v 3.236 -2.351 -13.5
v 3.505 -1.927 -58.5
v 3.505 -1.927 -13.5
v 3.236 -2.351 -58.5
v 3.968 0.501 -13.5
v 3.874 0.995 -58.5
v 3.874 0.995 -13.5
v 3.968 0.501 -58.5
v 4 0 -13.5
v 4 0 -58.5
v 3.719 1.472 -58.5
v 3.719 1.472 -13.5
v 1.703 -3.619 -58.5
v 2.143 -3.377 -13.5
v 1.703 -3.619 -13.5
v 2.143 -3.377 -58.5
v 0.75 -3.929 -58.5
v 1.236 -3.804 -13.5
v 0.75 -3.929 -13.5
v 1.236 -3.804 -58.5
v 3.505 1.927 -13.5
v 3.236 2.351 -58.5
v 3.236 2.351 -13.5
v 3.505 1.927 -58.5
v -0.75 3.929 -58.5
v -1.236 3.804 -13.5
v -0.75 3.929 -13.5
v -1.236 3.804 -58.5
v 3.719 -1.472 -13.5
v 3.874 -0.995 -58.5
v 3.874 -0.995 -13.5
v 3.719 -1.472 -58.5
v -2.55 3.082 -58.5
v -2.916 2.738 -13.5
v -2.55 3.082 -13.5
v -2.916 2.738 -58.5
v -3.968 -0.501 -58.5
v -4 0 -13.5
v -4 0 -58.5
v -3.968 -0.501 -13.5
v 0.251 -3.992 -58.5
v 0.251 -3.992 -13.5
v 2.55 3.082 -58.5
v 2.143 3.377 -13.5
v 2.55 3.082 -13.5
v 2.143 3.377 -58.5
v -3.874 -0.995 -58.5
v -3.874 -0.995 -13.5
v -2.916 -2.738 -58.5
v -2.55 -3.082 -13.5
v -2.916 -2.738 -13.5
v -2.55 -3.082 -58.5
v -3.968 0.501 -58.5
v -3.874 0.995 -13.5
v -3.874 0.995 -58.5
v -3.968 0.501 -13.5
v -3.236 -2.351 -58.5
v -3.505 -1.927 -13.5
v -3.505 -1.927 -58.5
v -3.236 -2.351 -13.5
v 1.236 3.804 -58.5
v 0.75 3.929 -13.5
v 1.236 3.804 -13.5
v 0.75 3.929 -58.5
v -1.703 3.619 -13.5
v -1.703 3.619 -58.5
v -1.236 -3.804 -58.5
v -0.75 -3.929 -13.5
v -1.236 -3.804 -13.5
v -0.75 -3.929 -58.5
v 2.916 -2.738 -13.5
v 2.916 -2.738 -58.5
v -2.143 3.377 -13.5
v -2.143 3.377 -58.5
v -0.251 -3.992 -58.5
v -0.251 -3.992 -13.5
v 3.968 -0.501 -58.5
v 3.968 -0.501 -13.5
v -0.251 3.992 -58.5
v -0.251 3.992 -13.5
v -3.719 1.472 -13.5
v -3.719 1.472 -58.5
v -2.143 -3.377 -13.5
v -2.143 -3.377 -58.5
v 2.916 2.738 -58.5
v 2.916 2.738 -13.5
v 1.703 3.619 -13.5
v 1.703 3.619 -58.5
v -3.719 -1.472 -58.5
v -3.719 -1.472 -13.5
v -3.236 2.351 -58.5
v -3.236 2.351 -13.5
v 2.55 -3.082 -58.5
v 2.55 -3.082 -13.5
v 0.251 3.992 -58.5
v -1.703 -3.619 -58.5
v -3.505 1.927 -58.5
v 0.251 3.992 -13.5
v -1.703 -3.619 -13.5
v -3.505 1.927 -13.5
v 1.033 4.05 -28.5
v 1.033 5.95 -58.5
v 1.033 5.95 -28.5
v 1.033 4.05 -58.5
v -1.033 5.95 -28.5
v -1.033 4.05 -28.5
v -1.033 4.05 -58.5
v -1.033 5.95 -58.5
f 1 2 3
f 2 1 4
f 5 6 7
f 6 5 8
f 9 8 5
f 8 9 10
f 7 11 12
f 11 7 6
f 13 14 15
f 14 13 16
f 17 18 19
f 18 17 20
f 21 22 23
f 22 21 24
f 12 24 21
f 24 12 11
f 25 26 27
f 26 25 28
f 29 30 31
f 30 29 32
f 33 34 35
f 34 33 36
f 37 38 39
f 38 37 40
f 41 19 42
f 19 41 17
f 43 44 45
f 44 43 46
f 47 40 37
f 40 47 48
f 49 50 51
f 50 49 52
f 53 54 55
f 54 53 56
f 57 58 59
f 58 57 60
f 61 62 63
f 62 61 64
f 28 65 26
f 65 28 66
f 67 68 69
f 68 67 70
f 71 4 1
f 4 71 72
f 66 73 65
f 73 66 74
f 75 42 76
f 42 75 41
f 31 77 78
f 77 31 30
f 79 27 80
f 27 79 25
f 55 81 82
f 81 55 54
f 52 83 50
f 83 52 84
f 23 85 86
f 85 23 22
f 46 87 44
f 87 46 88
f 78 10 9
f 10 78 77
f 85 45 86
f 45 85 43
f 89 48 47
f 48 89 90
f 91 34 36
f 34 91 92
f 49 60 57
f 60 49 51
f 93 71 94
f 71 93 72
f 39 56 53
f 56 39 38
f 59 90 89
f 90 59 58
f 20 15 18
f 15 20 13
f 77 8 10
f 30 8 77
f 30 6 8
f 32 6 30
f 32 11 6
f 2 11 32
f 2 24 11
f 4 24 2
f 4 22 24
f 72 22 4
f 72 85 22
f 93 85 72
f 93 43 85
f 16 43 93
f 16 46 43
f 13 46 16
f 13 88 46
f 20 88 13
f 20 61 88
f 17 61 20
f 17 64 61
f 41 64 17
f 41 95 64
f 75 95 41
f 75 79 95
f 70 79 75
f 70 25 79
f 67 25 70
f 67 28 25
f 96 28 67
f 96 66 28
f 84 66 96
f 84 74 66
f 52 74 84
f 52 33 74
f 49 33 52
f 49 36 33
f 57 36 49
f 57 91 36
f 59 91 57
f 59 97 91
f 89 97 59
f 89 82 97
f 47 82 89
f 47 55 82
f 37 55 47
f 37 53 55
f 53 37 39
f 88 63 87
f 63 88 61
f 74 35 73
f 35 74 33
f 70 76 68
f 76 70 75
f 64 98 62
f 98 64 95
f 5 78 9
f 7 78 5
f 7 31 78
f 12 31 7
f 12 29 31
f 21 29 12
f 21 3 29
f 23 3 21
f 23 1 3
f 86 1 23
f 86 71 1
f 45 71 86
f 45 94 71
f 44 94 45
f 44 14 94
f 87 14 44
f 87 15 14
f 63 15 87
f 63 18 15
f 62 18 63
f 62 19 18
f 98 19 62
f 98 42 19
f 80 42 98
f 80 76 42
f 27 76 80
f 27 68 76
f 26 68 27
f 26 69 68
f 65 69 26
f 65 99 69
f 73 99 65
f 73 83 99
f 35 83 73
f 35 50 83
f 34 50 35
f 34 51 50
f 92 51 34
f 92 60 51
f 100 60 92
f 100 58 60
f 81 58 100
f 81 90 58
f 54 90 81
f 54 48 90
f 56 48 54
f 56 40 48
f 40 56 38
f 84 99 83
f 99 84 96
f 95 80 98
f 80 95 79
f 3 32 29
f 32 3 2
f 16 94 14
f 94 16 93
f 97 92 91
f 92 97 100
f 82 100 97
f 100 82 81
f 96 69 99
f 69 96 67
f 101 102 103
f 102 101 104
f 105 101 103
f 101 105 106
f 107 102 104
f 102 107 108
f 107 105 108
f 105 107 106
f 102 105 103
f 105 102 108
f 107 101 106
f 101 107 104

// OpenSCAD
// file: steering_coupler.scad
$fn = 50;
include <../robot_settings.scad>


  module steering_coupler() {
  color("blue")
  difference() {
    cylinder(h = coupler_length, d = coupler_diameter, center = true);

    // top cutout for motor axle
    translate([0, 0, coupler_length / 2 - dc_motor_axle_notch_cutout_z / 2 + .1])
    cylinder(h = dc_motor_axle_notch_cutout_z, d = dc_motor_axle_cutout_d - dc_motor_axle_notch_cutout, center = true);

    // bottom cutout for steering shaft
    translate([0, 0,  - coupler_gear_side_insert / 2 - .1])
    cylinder(h = coupler_gear_side_insert, d = steering_shaft_d, center = true);

    // top screw cutout
    translate([0, 0, coupler_screw_z_offset])
    rotate([0, 90, 0])
    cylinder(h = coupler_diameter, d = coupler_screw_d, center = true);

    // bottom screw cutout
    translate([0, 0, -coupler_screw_z_offset])
    rotate([0, 90, 0])
    cylinder(h = coupler_diameter, d = coupler_screw_d, center = true);
  }
}


steering_coupler();
// file: ../robot_settings.scad
main_box_x = 95; // 96
main_box_y = 102;
main_box_z = 74; // 74.5
wall_thickness = 2;

rail_gap = 2;
rail_inset = 7;

rail_thickness = 7;
rail_length = 250;
rail_width = 200;

raspberry_pi_screw_seperation_y = 57;
raspberry_pi_screw_seperation_z = 48;
raspberry_pi_peg_h = 5;

battery_box_peg_h = 6;
battery_box_peg_d = 8;
battery_box_peg_cutout = 5;

gears_module = 1;
pinion_gear_teeth = 32;
pinion_gear_width = 5;
pinion_gear_bore = 8;

gears_setback_distance = 25;
gear_post_height = 2 * pinion_gear_width + rail_thickness + 8 ;

steering_motor_mount_x = 45;
steering_motor_mount_y = 36;
steering_motor_mount_z = 18;
steering_motor_mount_setback_distance = gears_setback_distance + 16;

dc_motor_drivertype = "Teyleten"; // Teyleten
isAdafruit = (dc_motor_drivertype == "Adafruit");

drv8871_x = isAdafruit ? 20.3 : 21.6;
drv8871_y = isAdafruit ?  24 : 25;

drv8871_z = 2;
drv8871_screw_d = 2.5;
drv8871_solder_points_z = 2;

drv8871mount_edge_x = 1.5;
drv8871mount_edge_wall = 3;
drv8871mount_z = 5;
drv8871mount_x = drv8871_x +  drv8871mount_edge_wall - 2* drv8871mount_edge_x;
drv8871mount_y = 19;

drv8871_screw_distance = 15.64;
drv8871_solder_points_d = 1.66;
drv8871_solder_offset_y = 4.4;
drv8871_solder_inner_points_distance = 5;
drv8871_solder_outer_points_distance = 12;

dc_motor_housing_minus_encoder_z = 48;
dc_motor_encoder_z = 9.33;
dc_motor_encoder_wheel_d = 13.4;
dc_motor_encoder_wheel_thickness = 5;
dc_motor_encoder_wheel_gap = 3;
dc_motor_encoder_circuit_thickness = 2;
dc_motor_cutout_d = 24.8;
dc_motor_cutout_z = 19.5;

dc_motor_screw_head_z = 2;
dc_motor_screw_head_d = 5.6;
dc_motor_screw_d = 3.2;
dc_motor_screw_offset = 8.5;

dc_motor_axle_ring_z = 3;
dc_motor_axle_ring_d = 7.2;
dc_motor_axle_cutout_d = 4.5;
dc_motor_axle_cutout_z = 10;
dc_motor_axle_notch_cutout = 0.4;
dc_motor_axle_notch_cutout_z = 6;

pdmount_x = 20;
pdmount_y = 30;
pdmount_z = 2;
pdmount_edge_x = 1.5;
pdmount_edge_wall = 3;

steering_shaft_z = 45;
steering_shaft_d = 7;
steering_shaft_motor_fitting_d = 9;
coupler_length = 24.6;
coupler_diameter = 14;
coupler_screw_d = 4;
coupler_screw_z_offset = 5;
coupler_gear_side_insert = 12.6;
steering_shaft_with_coupler_z = steering_shaft_z - coupler_gear_side_insert;

lidar_mount_y = 110;
lidar_mount_x = 65 + 20;
lidar_narrow_screws = 40;
lidar_wide_screws = 56;
lidar_front_to_back_screws = 70;
lidar_screw_d = 3;
lidar_circuitboard_x = 20;
lidar_circuitboard_y = 35;
lidar_circuitboard_z = 1.2;
lidar_cord_length = 29;

ball_bearing_height = 7;
ball_bearing_outer_diameter = 22;
ball_bearing_inner_diameter = 8;

 armature_holder_height = 20;
 armature_holder_thickness = 8;
pull_bar_peg_r = 3.2;
apparatus_locking_peg_d = 4;

rack_module = 1;
rack_length = main_box_x / 2;
rack_height = 10;
rack_width = 10;
rack_teeth = 30;
rack_bore = 3;

pull_bar_length = rail_width / 2 - rack_length + 1;

// tire hardware
axle_length = 30;
axle_reciever_inner_diameter = 7.75;
axle_reciever_length = 18.8;
axle_notch_length = 7;
axle_notch_cutout = 2.4;

// power distribution bar
power_bar_cutout_x = 96;
power_bar_y = 19.1;
power_bar_z = 1.5;
power_bar_screw_distance = 91.4;
power_bar_screw_d = 2.8;
power_bar_standoff_z = 5;
power_bar_standoff_d = 6.83;

// breadboard
breadboard_wall_thickness = 3;
breadboard_width = 55;
breadboard_length = 83;
breadboard_height = 10.5;
breadboard_notch_width = 4.2;
breadboard_longside_notch_separation = 58.2 - breadboard_notch_width / 2;
breadboard_shortside_notch_separation = 26.3 - breadboard_notch_width;

pico_expander_width = 63;
pico_expander_height = 57;
pico_screw_hole_offset = 3;
pico_screw_hole_d = 2.5;

usbhub_thickness = 11.7;
usbhub_depth = 37.5;
usbhub_width = 86.7;
usbhub_end_port_width = 14.8;
usbhub_end_port_height = 12;
usbhub_front_face_safe_zone_left = 15;
usbhub_front_face_safe_zone_right = 14.8;

switch_w = 16;
switch_cutout_d = 12.2;
switch_bump_h = 2;
switch_bump_l = 18.2;
// main file
$fn = 50;
include <../robot_settings.scad>
use <steering_coupler.scad>

 module dc_motor_mount(
      show_steering_shaft = true, 
      show_mount = false, 
      show_coupler = false
      ) 
      {

if (show_mount) {
    // mount with hole
  difference() {
    cube([
      steering_motor_mount_x, 
      steering_motor_mount_y, 
      dc_motor_axle_ring_z
    ], center = true);
    
    // steering rod hole in mount
    translate([0,0, -dc_motor_axle_ring_z / 2 - 1])
        cylinder(
          h = dc_motor_axle_ring_z + 2, 
          d = ball_bearing_inner_diameter
        );
    
    // side screw hole
    translate([dc_motor_screw_offset,0, -dc_motor_axle_ring_z / 2 - 1])
      cylinder(
        h = dc_motor_axle_ring_z + 2,
        d = dc_motor_screw_d
      );
    
    // side scew hole
    translate([-dc_motor_screw_offset, 0, -dc_motor_axle_ring_z / 2 - 1])
    cylinder(
      h = dc_motor_axle_ring_z + 2,
      d = dc_motor_screw_d
    ); 
    
    // couter sink
    translate([dc_motor_screw_offset,0,-dc_motor_axle_ring_z / 2 - .1])
    cylinder(
      h = dc_motor_screw_head_z,
      d = dc_motor_screw_head_d
    );
    
    // counter sink
    translate([-dc_motor_screw_offset,0,-dc_motor_axle_ring_z / 2 - .1])
    cylinder(
      h = dc_motor_screw_head_z,
      d = dc_motor_screw_head_d
    );
   }
  }

  if (show_steering_shaft) {
      // motor connection
        // shorten the main shaft
      
    translate([0,0, -steering_shaft_z - dc_motor_axle_ring_z / 2 - coupler_length + coupler_gear_side_insert]) {
        difference() {
        color("blue")
        cylinder(h = steering_shaft_z, d = ball_bearing_inner_diameter);
     }
      
      // key
      translate([0, ball_bearing_inner_diameter - 3, 15])
        cube([ball_bearing_inner_diameter / 3 - .6 , 1.9, 30], center = true);
     }
    
    if (show_coupler) {
      translate([0, 0,  - coupler_length / 2 - dc_motor_axle_ring_z / 2])
      rotate([0, 0, 90])
      steering_coupler();
    }
  }
}
dc_motor_mount(show_steering_shaft = true);
